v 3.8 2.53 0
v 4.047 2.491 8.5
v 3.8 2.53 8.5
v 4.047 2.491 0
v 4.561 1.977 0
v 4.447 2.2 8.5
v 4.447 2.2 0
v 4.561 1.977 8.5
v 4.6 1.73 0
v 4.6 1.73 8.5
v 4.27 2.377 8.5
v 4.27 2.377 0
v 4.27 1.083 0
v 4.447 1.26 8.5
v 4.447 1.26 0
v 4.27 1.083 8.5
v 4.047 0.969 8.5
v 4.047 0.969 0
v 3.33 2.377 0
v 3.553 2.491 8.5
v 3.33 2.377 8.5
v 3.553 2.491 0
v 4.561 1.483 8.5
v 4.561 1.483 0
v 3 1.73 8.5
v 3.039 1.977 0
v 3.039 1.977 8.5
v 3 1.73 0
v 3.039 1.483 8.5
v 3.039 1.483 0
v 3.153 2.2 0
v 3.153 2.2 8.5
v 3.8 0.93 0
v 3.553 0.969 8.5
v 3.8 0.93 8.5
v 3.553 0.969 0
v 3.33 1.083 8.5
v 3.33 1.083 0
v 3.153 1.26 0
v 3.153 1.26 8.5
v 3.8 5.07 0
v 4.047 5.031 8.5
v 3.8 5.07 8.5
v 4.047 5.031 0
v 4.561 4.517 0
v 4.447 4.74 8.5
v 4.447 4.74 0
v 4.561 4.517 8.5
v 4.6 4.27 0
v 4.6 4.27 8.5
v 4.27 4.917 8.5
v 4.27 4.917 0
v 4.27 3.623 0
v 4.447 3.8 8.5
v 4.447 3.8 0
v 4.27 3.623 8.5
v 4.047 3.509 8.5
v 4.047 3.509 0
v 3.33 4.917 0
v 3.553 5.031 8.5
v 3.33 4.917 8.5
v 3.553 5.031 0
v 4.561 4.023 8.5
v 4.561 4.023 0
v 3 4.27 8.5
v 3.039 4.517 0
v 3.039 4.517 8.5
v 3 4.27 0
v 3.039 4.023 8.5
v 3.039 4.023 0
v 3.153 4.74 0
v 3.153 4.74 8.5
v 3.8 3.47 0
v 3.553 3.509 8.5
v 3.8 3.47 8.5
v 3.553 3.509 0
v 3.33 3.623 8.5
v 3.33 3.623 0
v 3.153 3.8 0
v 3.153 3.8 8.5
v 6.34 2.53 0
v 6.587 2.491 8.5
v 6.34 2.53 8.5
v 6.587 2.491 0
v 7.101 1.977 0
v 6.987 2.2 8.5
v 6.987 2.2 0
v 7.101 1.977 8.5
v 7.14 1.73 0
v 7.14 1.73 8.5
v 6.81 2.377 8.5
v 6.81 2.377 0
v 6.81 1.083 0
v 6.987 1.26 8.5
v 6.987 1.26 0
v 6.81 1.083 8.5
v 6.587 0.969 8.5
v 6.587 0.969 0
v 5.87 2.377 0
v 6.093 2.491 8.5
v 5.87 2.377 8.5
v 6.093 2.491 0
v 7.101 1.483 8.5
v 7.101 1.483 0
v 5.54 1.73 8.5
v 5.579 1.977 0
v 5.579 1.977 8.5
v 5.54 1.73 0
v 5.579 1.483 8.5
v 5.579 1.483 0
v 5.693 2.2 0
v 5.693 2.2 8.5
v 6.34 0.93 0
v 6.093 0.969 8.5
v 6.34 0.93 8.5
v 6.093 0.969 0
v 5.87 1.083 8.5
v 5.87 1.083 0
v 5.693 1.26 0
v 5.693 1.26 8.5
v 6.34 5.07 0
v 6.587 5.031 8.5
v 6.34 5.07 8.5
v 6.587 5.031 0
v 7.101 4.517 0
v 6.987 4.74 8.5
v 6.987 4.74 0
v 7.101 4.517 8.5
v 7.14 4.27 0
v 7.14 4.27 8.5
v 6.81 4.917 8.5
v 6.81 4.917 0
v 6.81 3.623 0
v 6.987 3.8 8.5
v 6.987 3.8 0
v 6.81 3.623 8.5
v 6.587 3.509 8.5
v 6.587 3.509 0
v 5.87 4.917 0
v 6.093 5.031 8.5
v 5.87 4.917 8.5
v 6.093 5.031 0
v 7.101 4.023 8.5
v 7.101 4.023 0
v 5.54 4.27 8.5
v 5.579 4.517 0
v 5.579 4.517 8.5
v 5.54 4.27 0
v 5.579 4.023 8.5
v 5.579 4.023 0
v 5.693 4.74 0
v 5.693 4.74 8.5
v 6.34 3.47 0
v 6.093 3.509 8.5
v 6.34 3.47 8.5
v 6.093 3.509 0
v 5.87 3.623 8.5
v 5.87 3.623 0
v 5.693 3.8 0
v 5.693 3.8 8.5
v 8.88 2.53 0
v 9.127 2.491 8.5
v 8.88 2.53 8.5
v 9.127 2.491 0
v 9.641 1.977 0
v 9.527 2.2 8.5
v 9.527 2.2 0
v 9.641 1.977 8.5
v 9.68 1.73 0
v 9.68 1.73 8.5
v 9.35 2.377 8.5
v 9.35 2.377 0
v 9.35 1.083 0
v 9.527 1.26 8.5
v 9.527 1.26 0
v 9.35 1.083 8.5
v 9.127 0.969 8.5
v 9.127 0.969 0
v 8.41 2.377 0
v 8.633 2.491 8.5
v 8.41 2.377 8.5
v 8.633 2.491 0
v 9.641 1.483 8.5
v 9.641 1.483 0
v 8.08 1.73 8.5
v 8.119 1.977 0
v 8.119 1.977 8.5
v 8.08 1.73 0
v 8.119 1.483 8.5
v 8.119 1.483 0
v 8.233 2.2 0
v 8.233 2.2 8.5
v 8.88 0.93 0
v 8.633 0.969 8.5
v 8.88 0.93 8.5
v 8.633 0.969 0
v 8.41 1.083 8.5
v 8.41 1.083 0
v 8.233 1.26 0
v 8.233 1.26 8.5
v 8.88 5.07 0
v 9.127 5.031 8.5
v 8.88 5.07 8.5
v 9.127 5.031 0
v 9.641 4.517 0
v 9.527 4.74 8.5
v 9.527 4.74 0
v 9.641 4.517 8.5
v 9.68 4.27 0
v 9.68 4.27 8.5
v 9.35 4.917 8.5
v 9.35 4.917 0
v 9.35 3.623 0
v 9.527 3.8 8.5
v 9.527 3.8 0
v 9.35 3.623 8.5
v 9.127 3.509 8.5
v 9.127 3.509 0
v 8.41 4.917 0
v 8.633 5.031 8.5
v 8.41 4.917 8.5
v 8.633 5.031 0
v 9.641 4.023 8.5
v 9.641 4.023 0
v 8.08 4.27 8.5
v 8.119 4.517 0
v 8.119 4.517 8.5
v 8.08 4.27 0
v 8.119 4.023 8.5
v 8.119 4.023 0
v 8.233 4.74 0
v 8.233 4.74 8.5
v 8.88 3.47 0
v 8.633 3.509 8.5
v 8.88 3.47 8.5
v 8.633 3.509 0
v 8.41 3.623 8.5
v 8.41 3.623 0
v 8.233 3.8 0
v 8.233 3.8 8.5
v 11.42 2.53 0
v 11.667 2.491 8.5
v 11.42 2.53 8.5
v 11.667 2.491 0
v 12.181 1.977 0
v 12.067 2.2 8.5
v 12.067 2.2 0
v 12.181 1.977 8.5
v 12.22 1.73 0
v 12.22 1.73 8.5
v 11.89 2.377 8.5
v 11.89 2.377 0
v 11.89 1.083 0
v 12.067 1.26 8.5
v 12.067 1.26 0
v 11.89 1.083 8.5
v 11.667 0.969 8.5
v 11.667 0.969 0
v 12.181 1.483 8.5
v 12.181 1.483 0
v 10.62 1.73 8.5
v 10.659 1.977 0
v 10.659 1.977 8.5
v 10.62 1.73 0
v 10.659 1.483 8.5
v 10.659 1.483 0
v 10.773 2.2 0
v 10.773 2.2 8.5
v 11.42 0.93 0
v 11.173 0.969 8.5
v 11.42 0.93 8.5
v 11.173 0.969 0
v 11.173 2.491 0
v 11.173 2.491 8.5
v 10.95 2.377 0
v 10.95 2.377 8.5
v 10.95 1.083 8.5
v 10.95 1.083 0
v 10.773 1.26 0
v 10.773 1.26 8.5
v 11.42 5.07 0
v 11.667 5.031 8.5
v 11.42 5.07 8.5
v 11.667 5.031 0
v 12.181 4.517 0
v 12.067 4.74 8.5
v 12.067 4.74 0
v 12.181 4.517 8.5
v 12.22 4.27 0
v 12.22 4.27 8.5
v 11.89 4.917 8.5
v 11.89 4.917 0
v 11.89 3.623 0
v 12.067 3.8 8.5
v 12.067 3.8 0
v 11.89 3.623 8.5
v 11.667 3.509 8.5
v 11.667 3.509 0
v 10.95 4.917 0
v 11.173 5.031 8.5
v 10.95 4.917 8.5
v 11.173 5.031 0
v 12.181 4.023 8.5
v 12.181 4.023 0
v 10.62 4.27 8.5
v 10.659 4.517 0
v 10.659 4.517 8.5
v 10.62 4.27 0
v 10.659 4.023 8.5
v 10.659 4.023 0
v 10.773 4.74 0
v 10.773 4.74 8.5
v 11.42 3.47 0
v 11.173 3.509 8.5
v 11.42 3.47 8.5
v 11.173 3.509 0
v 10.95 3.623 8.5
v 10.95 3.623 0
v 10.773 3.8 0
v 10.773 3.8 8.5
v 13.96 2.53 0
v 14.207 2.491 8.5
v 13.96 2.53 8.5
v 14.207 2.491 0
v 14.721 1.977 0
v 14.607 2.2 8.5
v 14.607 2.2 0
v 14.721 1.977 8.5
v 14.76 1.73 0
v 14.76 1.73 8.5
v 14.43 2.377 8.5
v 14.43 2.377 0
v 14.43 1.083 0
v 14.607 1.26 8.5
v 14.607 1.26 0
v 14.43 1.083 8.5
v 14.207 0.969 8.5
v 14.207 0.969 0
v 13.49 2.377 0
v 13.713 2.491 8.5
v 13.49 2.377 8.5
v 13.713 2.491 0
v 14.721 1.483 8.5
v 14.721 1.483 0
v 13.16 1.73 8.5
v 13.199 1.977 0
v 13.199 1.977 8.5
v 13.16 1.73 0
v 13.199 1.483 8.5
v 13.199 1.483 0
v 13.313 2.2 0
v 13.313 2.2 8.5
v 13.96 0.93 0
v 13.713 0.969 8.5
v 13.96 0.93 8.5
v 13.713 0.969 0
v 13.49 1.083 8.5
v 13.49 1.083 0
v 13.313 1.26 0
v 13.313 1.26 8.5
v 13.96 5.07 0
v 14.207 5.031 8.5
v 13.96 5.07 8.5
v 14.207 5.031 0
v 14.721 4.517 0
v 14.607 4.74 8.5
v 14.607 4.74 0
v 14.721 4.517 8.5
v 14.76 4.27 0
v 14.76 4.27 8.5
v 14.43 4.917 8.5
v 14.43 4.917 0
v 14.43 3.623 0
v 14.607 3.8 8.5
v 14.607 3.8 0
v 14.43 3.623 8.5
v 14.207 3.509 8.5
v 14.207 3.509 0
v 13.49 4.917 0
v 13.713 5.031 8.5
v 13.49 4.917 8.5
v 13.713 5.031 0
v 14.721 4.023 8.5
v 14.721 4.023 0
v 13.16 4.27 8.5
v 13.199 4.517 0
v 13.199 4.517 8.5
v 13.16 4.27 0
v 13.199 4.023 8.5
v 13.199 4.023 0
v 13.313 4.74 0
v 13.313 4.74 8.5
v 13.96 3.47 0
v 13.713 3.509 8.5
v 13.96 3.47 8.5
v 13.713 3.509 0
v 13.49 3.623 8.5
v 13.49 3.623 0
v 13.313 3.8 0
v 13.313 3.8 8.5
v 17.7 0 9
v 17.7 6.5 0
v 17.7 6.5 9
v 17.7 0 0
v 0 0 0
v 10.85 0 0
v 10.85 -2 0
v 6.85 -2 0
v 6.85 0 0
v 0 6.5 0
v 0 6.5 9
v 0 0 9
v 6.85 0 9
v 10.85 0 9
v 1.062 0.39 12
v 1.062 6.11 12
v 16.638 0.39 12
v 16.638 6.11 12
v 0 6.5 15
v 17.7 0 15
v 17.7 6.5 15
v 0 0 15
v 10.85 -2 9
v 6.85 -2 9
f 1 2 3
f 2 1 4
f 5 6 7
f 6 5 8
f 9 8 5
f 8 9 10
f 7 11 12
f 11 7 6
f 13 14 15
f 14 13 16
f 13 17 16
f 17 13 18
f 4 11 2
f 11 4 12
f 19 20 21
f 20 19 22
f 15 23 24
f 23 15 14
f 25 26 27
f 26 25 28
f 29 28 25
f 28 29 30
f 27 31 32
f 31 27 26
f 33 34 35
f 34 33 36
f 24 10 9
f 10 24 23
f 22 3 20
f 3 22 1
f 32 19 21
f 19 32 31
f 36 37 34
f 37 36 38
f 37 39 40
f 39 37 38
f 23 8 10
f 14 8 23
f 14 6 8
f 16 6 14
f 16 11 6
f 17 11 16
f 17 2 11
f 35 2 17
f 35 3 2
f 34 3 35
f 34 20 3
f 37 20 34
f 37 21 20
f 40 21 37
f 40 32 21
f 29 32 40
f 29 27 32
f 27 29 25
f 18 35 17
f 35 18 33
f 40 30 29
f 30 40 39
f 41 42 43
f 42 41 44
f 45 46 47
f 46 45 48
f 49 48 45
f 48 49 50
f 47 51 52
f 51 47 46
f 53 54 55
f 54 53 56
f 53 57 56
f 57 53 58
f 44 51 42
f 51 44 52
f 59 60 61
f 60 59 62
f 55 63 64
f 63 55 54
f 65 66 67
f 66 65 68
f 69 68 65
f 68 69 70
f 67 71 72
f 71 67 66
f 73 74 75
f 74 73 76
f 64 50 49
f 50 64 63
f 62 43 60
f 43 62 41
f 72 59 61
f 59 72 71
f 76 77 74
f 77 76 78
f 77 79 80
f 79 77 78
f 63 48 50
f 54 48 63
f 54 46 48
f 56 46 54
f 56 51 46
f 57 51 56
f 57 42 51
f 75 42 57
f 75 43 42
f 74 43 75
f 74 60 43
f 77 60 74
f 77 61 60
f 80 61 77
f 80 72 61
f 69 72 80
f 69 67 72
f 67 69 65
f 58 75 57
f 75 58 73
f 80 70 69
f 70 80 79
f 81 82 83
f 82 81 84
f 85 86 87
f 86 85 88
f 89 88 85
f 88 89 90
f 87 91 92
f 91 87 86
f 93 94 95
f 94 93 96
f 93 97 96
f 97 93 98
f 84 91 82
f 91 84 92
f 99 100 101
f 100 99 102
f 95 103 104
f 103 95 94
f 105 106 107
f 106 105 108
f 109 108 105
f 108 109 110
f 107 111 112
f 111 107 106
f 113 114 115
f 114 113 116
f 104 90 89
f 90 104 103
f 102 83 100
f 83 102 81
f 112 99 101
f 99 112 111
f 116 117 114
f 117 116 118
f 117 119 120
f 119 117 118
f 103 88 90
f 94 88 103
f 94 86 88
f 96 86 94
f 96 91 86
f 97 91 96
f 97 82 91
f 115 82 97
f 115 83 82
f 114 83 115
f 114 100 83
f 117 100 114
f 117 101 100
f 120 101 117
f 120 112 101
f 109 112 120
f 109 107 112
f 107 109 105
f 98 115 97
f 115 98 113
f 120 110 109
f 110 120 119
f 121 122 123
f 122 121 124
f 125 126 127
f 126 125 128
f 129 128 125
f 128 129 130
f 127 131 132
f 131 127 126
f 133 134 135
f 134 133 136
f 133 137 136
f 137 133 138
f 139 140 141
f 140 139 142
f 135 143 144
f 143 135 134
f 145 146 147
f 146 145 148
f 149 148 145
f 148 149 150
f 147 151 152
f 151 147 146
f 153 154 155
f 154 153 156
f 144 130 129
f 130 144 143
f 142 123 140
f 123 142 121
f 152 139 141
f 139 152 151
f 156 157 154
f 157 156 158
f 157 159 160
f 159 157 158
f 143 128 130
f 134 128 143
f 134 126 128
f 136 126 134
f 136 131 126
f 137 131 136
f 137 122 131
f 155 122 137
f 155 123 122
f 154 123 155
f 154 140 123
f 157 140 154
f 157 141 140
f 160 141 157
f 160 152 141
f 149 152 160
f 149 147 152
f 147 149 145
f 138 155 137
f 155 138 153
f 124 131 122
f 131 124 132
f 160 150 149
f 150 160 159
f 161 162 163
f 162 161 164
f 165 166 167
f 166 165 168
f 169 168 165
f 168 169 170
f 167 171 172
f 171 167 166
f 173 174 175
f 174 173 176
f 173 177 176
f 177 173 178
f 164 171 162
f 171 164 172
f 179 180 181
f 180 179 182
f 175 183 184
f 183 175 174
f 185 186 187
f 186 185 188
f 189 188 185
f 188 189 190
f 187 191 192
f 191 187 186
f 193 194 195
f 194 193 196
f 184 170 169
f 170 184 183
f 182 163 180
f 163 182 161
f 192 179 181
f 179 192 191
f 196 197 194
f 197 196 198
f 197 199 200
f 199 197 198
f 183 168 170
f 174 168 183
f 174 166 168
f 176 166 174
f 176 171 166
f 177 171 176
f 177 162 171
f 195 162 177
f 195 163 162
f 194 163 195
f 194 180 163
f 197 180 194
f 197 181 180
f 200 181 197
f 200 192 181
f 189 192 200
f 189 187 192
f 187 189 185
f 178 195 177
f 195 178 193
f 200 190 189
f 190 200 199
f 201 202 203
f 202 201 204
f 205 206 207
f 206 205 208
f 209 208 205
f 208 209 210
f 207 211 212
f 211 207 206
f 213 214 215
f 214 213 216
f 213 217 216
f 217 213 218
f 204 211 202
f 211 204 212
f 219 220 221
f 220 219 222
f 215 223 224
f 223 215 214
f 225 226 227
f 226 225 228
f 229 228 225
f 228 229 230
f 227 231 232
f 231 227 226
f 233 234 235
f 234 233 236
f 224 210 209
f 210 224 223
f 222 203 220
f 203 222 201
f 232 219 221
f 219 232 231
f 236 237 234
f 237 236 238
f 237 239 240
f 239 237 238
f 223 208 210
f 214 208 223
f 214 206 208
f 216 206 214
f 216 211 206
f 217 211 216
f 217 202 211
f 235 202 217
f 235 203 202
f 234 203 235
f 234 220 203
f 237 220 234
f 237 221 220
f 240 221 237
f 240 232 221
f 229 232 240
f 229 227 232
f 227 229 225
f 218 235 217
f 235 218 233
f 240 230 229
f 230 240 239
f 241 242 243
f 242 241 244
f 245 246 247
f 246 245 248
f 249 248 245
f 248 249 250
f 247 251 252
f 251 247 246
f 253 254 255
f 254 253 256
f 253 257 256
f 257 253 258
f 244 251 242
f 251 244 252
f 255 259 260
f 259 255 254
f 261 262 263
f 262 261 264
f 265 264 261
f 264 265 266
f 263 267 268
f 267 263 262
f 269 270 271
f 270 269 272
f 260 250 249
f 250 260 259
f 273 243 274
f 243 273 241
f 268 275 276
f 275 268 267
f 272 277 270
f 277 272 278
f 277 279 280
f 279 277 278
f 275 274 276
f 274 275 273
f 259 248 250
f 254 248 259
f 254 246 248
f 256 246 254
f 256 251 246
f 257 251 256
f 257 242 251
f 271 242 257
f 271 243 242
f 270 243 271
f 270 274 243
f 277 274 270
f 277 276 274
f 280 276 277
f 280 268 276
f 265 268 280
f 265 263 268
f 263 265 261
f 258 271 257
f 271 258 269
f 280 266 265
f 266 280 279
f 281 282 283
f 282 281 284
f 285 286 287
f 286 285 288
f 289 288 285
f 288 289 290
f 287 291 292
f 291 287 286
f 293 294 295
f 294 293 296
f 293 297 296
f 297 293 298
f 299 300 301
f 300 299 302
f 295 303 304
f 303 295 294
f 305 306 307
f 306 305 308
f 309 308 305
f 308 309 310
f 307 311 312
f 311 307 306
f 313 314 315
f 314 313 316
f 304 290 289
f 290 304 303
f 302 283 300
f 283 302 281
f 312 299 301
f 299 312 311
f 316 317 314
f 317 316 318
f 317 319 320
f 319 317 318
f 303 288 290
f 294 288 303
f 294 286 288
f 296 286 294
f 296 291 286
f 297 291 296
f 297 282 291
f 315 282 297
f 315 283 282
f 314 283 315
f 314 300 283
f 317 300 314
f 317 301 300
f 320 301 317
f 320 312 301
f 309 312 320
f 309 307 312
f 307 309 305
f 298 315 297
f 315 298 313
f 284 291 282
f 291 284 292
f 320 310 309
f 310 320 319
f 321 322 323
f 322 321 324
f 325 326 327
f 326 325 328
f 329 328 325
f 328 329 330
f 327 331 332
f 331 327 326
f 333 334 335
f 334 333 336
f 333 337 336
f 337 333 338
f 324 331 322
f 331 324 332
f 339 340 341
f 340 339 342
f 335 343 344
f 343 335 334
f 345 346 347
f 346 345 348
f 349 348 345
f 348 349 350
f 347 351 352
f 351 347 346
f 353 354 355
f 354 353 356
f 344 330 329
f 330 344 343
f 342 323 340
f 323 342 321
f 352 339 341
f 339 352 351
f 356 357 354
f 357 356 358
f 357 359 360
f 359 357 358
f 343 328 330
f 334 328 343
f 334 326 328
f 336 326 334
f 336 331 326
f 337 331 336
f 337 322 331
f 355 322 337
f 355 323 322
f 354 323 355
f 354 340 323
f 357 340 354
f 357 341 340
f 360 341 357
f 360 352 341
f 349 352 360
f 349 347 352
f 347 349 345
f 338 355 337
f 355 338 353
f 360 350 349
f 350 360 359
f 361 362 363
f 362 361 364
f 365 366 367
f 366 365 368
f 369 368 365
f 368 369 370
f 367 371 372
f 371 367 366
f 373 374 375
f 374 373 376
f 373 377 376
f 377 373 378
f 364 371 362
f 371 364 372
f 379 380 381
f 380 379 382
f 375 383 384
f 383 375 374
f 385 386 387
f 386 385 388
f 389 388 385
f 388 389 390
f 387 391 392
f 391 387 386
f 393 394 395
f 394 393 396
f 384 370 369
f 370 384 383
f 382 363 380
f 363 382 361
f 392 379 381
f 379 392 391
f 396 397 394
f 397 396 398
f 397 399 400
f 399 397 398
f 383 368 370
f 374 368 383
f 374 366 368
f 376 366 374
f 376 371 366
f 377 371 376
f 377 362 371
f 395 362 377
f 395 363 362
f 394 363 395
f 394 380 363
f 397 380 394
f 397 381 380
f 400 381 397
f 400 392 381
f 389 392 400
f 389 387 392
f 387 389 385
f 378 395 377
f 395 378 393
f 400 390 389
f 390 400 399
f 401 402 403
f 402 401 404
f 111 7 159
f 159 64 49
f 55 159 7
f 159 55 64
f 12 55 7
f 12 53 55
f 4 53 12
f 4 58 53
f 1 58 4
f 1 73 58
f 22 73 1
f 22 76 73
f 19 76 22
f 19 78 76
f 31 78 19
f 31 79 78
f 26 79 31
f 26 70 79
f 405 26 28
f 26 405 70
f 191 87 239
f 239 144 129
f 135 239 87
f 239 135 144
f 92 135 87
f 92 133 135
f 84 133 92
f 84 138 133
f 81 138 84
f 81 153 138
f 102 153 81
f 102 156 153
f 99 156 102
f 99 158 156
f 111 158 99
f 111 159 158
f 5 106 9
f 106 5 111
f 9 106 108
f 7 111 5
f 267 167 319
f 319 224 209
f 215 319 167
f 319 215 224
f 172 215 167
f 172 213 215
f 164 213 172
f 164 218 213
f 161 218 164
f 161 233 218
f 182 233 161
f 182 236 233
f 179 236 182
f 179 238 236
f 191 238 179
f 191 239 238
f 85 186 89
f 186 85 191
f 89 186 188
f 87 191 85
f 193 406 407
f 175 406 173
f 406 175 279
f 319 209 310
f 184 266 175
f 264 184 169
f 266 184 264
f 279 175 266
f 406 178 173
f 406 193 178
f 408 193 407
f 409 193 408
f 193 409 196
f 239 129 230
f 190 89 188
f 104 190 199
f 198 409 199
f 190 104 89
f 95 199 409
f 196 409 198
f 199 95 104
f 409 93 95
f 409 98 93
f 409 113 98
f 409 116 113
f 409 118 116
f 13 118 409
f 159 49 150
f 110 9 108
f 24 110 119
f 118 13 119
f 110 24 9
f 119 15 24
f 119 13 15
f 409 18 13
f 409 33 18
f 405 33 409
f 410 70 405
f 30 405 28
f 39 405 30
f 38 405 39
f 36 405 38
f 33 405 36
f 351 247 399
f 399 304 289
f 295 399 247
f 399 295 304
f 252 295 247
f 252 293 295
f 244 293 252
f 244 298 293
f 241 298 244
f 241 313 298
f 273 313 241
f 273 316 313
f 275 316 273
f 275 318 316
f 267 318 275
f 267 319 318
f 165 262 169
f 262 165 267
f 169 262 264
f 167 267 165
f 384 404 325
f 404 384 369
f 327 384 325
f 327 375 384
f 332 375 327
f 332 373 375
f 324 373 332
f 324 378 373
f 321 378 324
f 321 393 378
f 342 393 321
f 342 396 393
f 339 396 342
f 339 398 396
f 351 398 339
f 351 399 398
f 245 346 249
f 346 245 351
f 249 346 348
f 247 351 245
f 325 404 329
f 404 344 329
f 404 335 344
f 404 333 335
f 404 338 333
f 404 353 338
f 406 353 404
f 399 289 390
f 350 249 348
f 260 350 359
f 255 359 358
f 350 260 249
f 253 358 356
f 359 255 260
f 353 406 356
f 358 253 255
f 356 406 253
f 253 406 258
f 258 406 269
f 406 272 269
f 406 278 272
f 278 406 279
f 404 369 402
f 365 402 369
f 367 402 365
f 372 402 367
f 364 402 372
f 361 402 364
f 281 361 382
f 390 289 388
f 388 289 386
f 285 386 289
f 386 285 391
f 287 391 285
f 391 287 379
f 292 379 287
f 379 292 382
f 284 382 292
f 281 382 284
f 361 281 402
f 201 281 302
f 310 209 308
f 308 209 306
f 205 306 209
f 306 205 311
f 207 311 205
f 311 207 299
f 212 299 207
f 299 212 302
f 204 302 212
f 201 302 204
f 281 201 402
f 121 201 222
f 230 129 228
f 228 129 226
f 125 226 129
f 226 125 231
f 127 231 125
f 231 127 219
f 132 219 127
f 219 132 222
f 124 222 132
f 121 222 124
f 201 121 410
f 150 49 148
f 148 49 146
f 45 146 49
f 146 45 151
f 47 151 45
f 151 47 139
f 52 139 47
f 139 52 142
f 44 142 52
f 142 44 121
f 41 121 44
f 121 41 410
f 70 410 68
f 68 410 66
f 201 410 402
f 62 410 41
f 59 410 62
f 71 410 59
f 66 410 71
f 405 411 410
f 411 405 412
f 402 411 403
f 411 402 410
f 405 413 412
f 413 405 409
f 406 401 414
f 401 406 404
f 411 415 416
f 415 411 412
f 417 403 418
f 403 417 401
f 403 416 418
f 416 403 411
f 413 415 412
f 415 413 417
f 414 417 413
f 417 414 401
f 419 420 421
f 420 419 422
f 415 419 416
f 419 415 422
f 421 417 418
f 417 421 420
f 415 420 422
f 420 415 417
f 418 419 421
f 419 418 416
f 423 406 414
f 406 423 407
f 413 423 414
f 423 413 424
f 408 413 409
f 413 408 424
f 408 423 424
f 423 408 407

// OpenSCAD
// 5 for 10-pin, 8 for 16-pin, etc
PinsPerCol = 5; 

width = 5.0 + PinsPerCol * 2.54;

// Pins are 1mm, make it larger for better fit
PinSize = 1.6;

module mainConnector() {
    difference(){
        cube([width, 6.5, 9]);
        for (i = [ 0 : PinsPerCol - 1] ){
            union() {
                translate([i * 2.54 + 3.8, 1.73, 0]) {
                    cylinder(h = 17, r = PinSize / 2, center = true, $fn=20);
                }
                translate([i * 2.54 + 3.8, 4.27, 0]) {
                    cylinder(h = 17, r = PinSize / 2, center = true, $fn=20);
                }
            }
        }
    }
}

module handle() {
    union() {
        linear_extrude(height=3, scale=0.88) {
            square([width, 6.5], center= true);
        }
        
    }
}

union() {
    mainConnector();
    translate([width / 2, 3.25, 9]) {
        handle();
    }
    translate([width / 2, 3.25, 15]) {
        rotate([180, 0, 0]) {
            handle();
        }
    }
    translate([width / 2 - 2,-2,0]) {
        cube([4, 2, 9]);
    }
}
